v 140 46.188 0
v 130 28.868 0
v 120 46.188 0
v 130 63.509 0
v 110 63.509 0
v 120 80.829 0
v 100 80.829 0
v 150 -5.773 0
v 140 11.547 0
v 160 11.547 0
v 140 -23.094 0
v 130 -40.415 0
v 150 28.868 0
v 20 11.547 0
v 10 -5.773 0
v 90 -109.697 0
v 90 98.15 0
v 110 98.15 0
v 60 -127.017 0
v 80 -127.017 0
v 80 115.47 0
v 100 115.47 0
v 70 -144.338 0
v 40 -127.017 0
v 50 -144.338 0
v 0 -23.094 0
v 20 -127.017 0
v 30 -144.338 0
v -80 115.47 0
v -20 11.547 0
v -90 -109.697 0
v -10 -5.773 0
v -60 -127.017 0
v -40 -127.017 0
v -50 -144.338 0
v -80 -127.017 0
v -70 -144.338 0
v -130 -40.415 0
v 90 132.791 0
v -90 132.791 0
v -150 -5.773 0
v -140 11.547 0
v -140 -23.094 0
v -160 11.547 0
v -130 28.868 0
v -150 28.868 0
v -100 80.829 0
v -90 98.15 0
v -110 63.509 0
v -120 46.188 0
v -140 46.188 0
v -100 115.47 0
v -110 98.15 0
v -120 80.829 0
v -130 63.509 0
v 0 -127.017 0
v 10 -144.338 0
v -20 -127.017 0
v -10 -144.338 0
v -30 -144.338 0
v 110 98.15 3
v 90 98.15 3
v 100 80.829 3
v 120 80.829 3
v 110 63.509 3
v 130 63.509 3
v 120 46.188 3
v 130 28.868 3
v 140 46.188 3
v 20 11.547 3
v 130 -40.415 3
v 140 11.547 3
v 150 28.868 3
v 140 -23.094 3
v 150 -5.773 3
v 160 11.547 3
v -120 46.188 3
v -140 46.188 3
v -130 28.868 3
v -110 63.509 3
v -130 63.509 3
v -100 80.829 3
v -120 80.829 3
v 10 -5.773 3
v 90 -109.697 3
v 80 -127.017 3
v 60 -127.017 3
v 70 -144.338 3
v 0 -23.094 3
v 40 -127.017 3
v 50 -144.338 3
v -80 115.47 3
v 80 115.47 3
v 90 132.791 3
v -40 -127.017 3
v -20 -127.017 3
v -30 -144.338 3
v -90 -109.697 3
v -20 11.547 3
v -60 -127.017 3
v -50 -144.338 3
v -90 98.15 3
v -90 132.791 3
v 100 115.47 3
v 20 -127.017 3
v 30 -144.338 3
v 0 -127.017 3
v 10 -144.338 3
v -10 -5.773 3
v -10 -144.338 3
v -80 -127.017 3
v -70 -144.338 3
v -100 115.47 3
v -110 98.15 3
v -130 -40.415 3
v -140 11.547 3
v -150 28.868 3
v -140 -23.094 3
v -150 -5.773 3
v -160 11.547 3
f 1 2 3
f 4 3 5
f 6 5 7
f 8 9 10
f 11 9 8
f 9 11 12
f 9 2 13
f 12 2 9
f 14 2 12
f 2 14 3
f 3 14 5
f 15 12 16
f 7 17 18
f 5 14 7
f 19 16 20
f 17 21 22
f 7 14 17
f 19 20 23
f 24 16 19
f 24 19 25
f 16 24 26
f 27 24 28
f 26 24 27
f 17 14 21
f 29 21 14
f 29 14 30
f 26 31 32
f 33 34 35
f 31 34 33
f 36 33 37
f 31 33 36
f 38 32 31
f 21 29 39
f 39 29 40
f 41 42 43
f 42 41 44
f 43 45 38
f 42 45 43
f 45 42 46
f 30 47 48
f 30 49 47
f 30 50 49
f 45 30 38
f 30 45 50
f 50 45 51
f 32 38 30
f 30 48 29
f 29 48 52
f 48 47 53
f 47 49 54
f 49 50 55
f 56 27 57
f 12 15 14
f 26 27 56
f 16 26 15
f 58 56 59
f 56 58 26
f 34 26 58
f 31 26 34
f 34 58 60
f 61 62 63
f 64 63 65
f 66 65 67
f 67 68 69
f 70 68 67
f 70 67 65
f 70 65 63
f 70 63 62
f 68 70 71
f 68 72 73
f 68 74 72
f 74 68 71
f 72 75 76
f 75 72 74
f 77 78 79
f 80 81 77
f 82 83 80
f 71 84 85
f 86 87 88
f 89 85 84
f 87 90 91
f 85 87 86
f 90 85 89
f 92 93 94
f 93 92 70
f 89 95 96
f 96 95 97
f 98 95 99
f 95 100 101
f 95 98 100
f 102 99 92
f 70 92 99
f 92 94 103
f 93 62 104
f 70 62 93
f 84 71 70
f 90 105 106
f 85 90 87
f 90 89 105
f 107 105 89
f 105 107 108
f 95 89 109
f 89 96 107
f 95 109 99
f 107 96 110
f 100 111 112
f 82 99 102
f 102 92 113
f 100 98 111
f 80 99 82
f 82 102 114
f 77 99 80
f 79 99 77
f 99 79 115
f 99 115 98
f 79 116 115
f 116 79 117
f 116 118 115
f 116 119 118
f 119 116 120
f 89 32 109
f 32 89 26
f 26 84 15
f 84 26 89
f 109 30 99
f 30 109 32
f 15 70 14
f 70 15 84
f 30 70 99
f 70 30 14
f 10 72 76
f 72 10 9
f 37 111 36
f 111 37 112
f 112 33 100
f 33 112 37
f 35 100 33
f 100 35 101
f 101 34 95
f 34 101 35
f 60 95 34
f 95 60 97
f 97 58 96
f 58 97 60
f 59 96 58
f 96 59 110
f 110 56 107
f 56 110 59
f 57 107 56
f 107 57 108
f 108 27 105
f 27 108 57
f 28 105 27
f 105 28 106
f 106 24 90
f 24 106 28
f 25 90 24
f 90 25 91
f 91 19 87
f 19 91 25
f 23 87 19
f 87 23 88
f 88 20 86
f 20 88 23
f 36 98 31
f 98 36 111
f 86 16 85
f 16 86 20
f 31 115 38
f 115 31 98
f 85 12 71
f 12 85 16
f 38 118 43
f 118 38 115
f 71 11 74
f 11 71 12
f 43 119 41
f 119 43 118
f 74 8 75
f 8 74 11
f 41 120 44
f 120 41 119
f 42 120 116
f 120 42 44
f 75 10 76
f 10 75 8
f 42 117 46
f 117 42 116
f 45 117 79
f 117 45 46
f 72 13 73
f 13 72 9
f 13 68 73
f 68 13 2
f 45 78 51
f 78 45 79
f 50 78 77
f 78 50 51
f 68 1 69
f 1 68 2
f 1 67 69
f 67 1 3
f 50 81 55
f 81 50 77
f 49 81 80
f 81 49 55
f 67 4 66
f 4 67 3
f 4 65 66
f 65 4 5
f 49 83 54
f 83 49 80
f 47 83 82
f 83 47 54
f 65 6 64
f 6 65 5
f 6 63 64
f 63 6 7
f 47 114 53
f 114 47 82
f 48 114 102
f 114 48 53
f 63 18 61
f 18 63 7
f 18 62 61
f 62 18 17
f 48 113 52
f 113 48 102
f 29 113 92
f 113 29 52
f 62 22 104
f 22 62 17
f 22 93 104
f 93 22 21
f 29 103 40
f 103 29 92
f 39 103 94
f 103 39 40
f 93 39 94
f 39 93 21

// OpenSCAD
// file: ../../src/semi_regular/tess_4_8_8.scad
/*
    Tessella: Semi-Regular Tessellation - 4.8.8
    ===========================================
    This module implements the tessellation of a plane using a semi-regular tiling
    pattern defined by the vertex configuration 4.8.8, where one square and two
    octagons meet at each vertex.
*/

include <../tessUtils.scad>;

/**
 * @brief Generates center points for an octagonal grid.
 *
 * Creates a 2D grid of center points for octagons spaced by the octagon's side length.
 *
 * @param radius The radius of each octagon.
 * @param n The number of octagons along the x-axis.
 * @param m The number of octagons along the y-axis.
 * @param rotate (Optional) Boolean to apply rotation to the grid, default is true.
 * @return An array of center points for octagons.
 */
function octagons_centers_rect(
    radius,
    n,
    m
) =
    let (
        side_length = (radius * 2) / (sqrt(4 + 2 * sqrt(2))), // Side length of the octagon
        total_width = side_length * (1 + sqrt(2)) // Total width including spacing
    ) squares_centers_rect(total_width, n, m);

/**
 * @brief Generates center points for the squares in a 4.8.8 tiling grid.
 *
 * Aligns the square centers with the octagonal centers by using a shifted grid,
 * creating the required semi-regular tiling pattern.
 *
 * @param radius The radius of the octagons.
 * @param n The number of octagons along the x-axis.
 * @param m The number of octagons along the y-axis.
 * @return An array of center points for squares.
 */
function squares_8_8_centers_rect(radius, n, m) =
    let (
        side_length = (radius * 2) / (sqrt(4 + 2 * sqrt(2))), // Side length of the octagon
        total_width = side_length * (1 + sqrt(2)), // Total width including spacing
        shift_x = total_width / 2, // Horizontal shift for squares
        shift_y = total_width / 2 // Vertical shift for squares
    ) [for (c = squares_centers_rect(total_width, n - 1, m - 1)) [c[0] + shift_x, c[1] + shift_y]];

/**
 * @brief Generates vertices for octagons based on radius and center points.
 *
 * Generates the vertices for octagons based on the provided center points and radius.
 *
 * @param radius The radius of each octagon.
 * @param centers Array of center points.
 * @param angular_offset (Optional) Rotation angle for vertices, default is 22.5°.
 * @return Array of vertices for each octagon.
 */
function octagons_vertices(radius, centers, angular_offset = 22.5) =
    [
        for (center = centers) [
            for (i = [0:7]) let (
                angle = i * 45 + angular_offset
            ) [center[0] + radius * cos(angle), center[1] + radius * sin(angle)],
        ],
    ];
// file: ../../src/regular/triangles.scad
/*
    Tessella: Regular Tessellation - Triangles
    ==========================================
    This module implements the tessellation of a plane using regular triangles,
    where each tile is congruent, and all vertex angles around a point sum to 360°.

    Polygon properties:
    - Sides: 3
    - Interior Angle: 60°
    - Vertex Configuration: 3.3.3.3.3.3

    Mathematically valid because the interior angle divides 360° exactly.
    Reference: Euclidean tessellation theory for regular polygons.
*/

include <../tessUtils.scad>;

/**
 * @brief Generates center points for a "levels-based" triangle arrangement.
 *
 * Creates a roughly radial or diamond-like pattern of triangle centers. The center row
 * has (2*levels - 1) triangles, each additional row above/below decreases by 1 triangle.
 *
 * @param side   The side length of each equilateral triangle.
 * @param levels Number of levels away from the center row.
 * @return       An array of center points for triangles.
 */
function triangles_centers_radial(side, levels) =
    let (
        // Vertical height of each triangle
        vheight = side * sqrt(3) / 2,
        // Generate rows symmetrically around the center
        rows0 = [
            for (i = [-ceil(levels / 2 - 1):ceil(levels / 2 - 1)])
            let (
                rowCount = (levels - ( (levels + 1) % 2)) - abs(i), // Number of triangles in the row
                yOff = i * vheight, // Vertical offset for the row
                xStart = -(rowCount - 1) * side / 2 // Horizontal start to center the row
            ) [[xStart, yOff], rowCount],
        ],
        rows1 = (levels == 1) ? []
        : [
            for (i = [-(floor(levels / 2)):(floor(levels / 2 - 1))])
            let (
                rowCount = (levels - ( (levels) % 2)) - abs(i), // Number of triangles in the row
                yOff = i * vheight + vheight / 2 - (vheight - sqrt(3) / 3 * side) / 2, // Vertical offset for the row
                xStart = -(rowCount - 1) * side / 2 // Horizontal start to center the row
            ) [[xStart, yOff], rowCount],
        ],
        rows = concat(rows0, rows1)
    )
    // Generate center points for all rows
    [for (row = rows) for (j = [0:row[1] - 1]) [row[0][0] + j * side, row[0][1]]];

/**
 * @brief Generates center points for a rectangular grid of equilateral triangles (n x m).
 *
 * Alternating rows are horizontally offset by half a side for a typical triangular tiling pattern.
 *
 * @param side The side length of each triangle.
 * @param n    Number of triangles along x-axis.
 * @param m    Number of rows (y-axis).
 * @return     An array of center points for triangles.
 */
function triangles_centers_rect(side, n, m) =
    let (
        vheight = side * sqrt(3) / 2, // Vertical height of each triangle
        col_shift = side / 2, // Horizontal shift for each column
        row_shift = vheight, // Horizontal shift for alternating rows
        offset_shift = row_shift - (vheight - sqrt(3) / 3 * side) * 2
    ) [for (j = [0:m - 1], i = [0:n - 1]) [(i) * row_shift + (offset_shift * (j % 2)), j * col_shift]];

/**
 * @brief Generates vertices for equilateral triangles at specified centers.
 *
 * Rotates every other row by 180° and applies an additional angular offset for customization.
 *
 * @param side           The side length of each triangle.
 * @param centers        The array of center points for the triangles.
 * @param angular_offset An additional angular offset to apply to all triangles.
 * @param is_radial      If true, calculates the row index based on radial arrangement.
 * @return               A nested array of vertices for all triangles.
 */
function triangle_vertices(side, centers, angular_offset = 0, rect = true) =
    let (
        EPSILON = 1e-9, // Small value for floating-point comparison
        vheight = side * sqrt(3) / 2, // Vertical height of each triangle
        // This messy line pretty much determines if a row is odd or even based on the vertical position, it needs to check
        // using the reverse calculation of rows1 / offset shift, looking at that now it should probably be refactored.
        // Overall, this works and gets the geometrical idea across, but it's not the most readable (literally horrendous).
        row_parity = [
            for (c = centers) (
                (
                    ( ( ( (rect ? c[0] : c[1]) + EPSILON - vheight / 2 + (vheight - sqrt(3) / 3 * side) / 2) / vheight) % 1) <= EPSILON
                ) && (
                    (
                        ( ( (rect ? c[0] : c[1]) - EPSILON - vheight / 2 + (vheight - sqrt(3) / 3 * side) / 2) / vheight) % 1
                    ) >= -EPSILON
                ) ? 0
                : 1
            ),
        ], // Calculate row parity
        rotation_adjustment = [
            for (i = [0:len(centers) - 1]) (
                row_parity[i] ? (rect ? 0 : 180)
                : (rect ? 180 : 0)
            ),
        ] // Flip every other row
    ) [
            for (i = [0:len(centers) - 1]) [
                for (j = [0:2]) let (
                    angle = j * 120 + angular_offset + rotation_adjustment[i]
                ) [
                        centers[i][0] + side / sqrt(3) * cos(angle),
                        centers[i][1] + side / sqrt(3) * sin(angle),
                ],
            ],
    ];
// file: ../../src/regular/squares.scad
/*
    Tessella: Regular Tessellation - Squares
    ========================================
    This module implements the tessellation of a plane using regular squares,
    where each tile is congruent, and all vertex angles around a point sum to 360°.

    Polygon properties:
    - Sides: 4
    - Interior Angle: 90°
    - Vertex Configuration: 4.4.4.4
*/

include <../tessUtils.scad>;

/**
 * @brief Generates center points for a "levels-based" square arrangement.
 *
 * Creates a diamond-like pattern of square centers. The center (middle) row has (2*levels - 1) squares.
 * Each additional row above or below the center has one fewer square, until only 1 square remains at the
 * top and bottom (when levels > 1).
 *
 * @param side   The side length of each square.
 * @param levels Number of levels (rows above the center, plus the center, plus rows below).
 * @return       An array of center points for squares.
 */
function squares_centers_radial(side, levels) =
    let (
        // Offsets for spacing
        offset_x = side, // Horizontal spacing
        offset_y = side, // Vertical spacing

        // Generate rows from the center outward
        // Row i = -(levels-1) to +(levels-1), where i=0 is the center row.
        rows = [
            for (i = [-(levels - 1):(levels - 1)])
            let (
                rowCount = (2 * levels - 1) - abs(i), // Number of squares in the row
                yOff = i * offset_y, // Vertical position of the row
                xStart = -(rowCount - 1) * offset_x / 2 // Horizontal start to center the row
            ) [[xStart, yOff], rowCount],
        ]
    )
    // For each row definition, generate square center points
    [for (row = rows) for (j = [0:row[1] - 1]) [row[0][0] + j * offset_x, row[0][1]]];

/**
 * @brief Generates center points for a rectangular grid of squares (n x m).
 *
 * Produces a 2D grid of center points spaced by side length in both x and y directions.
 *
 * @param side The side length of each square.
 * @param n    The number of squares along the x-axis.
 * @param m    The number of squares along the y-axis.
 * @return     An array of center points for squares.
 */
function squares_centers_rect(side, n, m) =
    let (offset_x = side, offset_y = side) [for (ix = [0:n - 1], iy = [0:m - 1]) [ix * offset_x, iy * offset_y]];

/**
 * @brief Renders 2D squares at specified centers, with optional color gradient.
 *
 * @param side          The side length of each square.
 * @param spacing       (Optional) Spacing between squares, default is 0.
 * @param centers       (Optional) Array of center points. If empty, `levels` or (n,m) must be provided.
 * @param levels        (Optional) Number of levels for diamond-like pattern generation.
 * @param n, m          (Optional) Grid dimensions if using NxM generation.
 * @param color_scheme  (Optional) Name of the color scheme for gradient.
 * @param alpha         (Optional) Alpha transparency value.
 */

function squares_vertices(side, centers, angular_offset = 45) =
    [
        for (
            center = centers
        ) [
            for (i = [0:3]) let (angle = i * 90 + angular_offset) [
                    center[0] + side / sqrt(2) * cos(angle),
                    center[1] + side / sqrt(2) * sin(angle),
            ],
        ],
    ];
// file: ../../src/regular/hexagons.scad
/*
    Tessella: Regular Tessellation - Hexagons
    =========================================
    Tessellates a plane using regular hexagons.
    Properties:
    - Sides: 6
    - Interior Angle: 120°
    - Vertex Configuration: 6.6.6
*/

include <../tessUtils.scad>;

/**
 * Generates center points for a hexagonal tessellation in a radial pattern.
 * @param radius The radius of each hexagon.
 * @param levels Number of radial levels.
 * @return Array of hexagon center points.
 */
function hexagons_centers_radial(radius, levels) =
    let (
        offset_x = radius * cos(30),
        offset_y = radius + radius * sin(30),
        offset_step = 2 * offset_x,
        dx = -(levels - 1) * offset_x * 2,
        beginning_n = 2 * levels - 1,
        hexagons_pts = function(hex_datum)
        let (
            tx = hex_datum[0][0] + dx,
            ty = hex_datum[0][1],
            n_pts = hex_datum[1],
            offset_xs = [for (i = [0:n_pts - 1]) i * offset_step]
        ) [for (x = offset_xs) [x + tx, ty]],
        upper_hex_data = levels > 1 ? [
                for (i = [1:beginning_n - levels]) let (
                    x = offset_x * i,
                    y = offset_y * i,
                    n_upper = beginning_n - i
                ) [[x, y], n_upper],
            ]
        : [],
        lower_hex_data = levels > 1 ? [for (hex_datum = upper_hex_data) [[hex_datum[0][0], -hex_datum[0][1]], hex_datum[1]]]
        : [],
        total_hex_data = [[[0, 0], beginning_n], each upper_hex_data, each lower_hex_data],
        centers = [for (hex_datum = total_hex_data) hexagons_pts(hex_datum)]
    ) concat([for (c = centers) each c]);

/**
 * Generates center points for a rectangular hexagonal grid.
 * @param radius The radius of each hexagon.
 * @param n Number of hexagons along x-axis.
 * @param m Number of hexagons along y-axis.
 * @return Array of hexagon center points.
 */
function hexagons_centers_rect(radius, n, m) =
    let (
        offset_x = radius * cos(30),
        offset_y = radius + radius * sin(30),
        offset_step = 2 * offset_x
    ) [for (i = [0:n - 1], j = [0:m - 1]) [i * offset_step + (j % 2) * (offset_step / 2), j * offset_y]];

/**
 * Generates vertices for hexagons based on radius and center points.
 * @param radius The radius of each hexagon.
 * @param centers Array of center points.
 * @param angular_offset Rotation angle for vertices.
 * @return Array of vertices for each hexagon.
 */
function hexagons_vertices(radius, centers, angular_offset = 30) =
    [
        for (center = centers) [
            for (i = [0:5]) let (
                angle = i * 60 + angular_offset
            ) [center[0] + radius * cos(angle), center[1] + radius * sin(angle)],
        ],
    ];
// file: ../../src/tessUtils.scad
EPSILON = 1e-3; ///< Tolerance value used for floating-point comparisons.

/**
 * @brief Generates a gradient color based on normalized coordinates and a color scheme.
 *
 * Selects a color by mapping normalized x and y coordinates to RGB values according to the specified color scheme.
 *
 * @param normalized_x The normalized x-coordinate (0 to 1).
 * @param normalized_y The normalized y-coordinate (0 to 1).
 * @param color_scheme The name of the color scheme to use.
 * @return An RGB color array [r, g, b].
 */
function get_gradient_color(normalized_x, normalized_y, color_scheme) =
    color_scheme == "scheme1" ? [normalized_x, 1 - normalized_x, normalized_y]
    : // Red to Blue
    color_scheme == "scheme2" ? [1 - normalized_y, normalized_x, normalized_y]
    : // Green to Magenta
    color_scheme == "scheme3" ? [normalized_y, 1 - normalized_y, normalized_x]
    : // Blue to Yellow
    color_scheme == "scheme4" ? [1 - normalized_x, normalized_x, 1 - normalized_y]
    : // Cyan to Red
    color_scheme == "scheme5" ? [normalized_x, normalized_x * normalized_y, 1 - normalized_x]
    : // Purple to Green
    color_scheme == "scheme6" ? [1 - normalized_x * normalized_y, normalized_y, normalized_x]
    : // Orange to Blue
    [0.9, 0.9, 0.9]; // Default color (grey) if no valid color scheme is provided

/**
 * @brief Renders points as text labels and optional spheres in the 3D space.
 *
 * Displays each point's coordinates as text at its location and optionally places a sphere at the point.
 *
 * @param points An array of points to display, each as [x, y].
 * @param text_size (Optional) Size of the text labels; default is 1.
 * @param color (Optional) Color of the text labels; default is [0.1, 0.1, 0.1].
 * @param pointD (Optional) Diameter of the sphere to place at each point; if undef, no sphere is placed.
 * @param point_color (Optional) Color of the spheres; default is [0.1, 0.1, 0.1].
 * @param fn (Optional) Number of facets for the spheres; default is 8.
 */
module print_points(
    points,
    text_size = 1,
    color = [0.1, 0.1, 0.1],
    pointD = undef,
    point_color = [0.1, 0.1, 0.1],
    fn = 8
) {
    for (point = points) {
        // Translate +1 in Z-axis to avoid z-fighting with the surface
        translate([point[0], point[1] + pointD * 2, pointD * 2]) color(color)
                text(str("[", point[0], ", ", point[1], "]"), size=text_size, valign="center", halign="center");
        if (pointD != undef) {
            // Place a sphere at the point if pointD is specified
            color(point_color) translate([point[0], point[1], 0]) sphere(pointD, $fn=fn);
        }
    }
}

/**
 * @brief Checks if two points are equal within a specified tolerance.
 *
 * @param p1 First point as [x, y].
 * @param p2 Second point as [x, y].
 * @param tolerance (Optional) Tolerance value for comparison; default is EPSILON.
 * @return True if points are equal within tolerance, false otherwise.
 */
function points_equal(p1, p2, tolerance = EPSILON) =
    let (
        comparisons = [
            for (i = [0:len(p1) - 1]) abs(p1[i] - p2[i]) < tolerance,
        ]
    )
    // Check if all comparisons are true
    len([for (comp = comparisons) if (comp) true]) == len(comparisons);

/**
 * @brief Checks if a point exists within a list of points, within a specified tolerance.
 *
 * @param point The point to check, as [x, y].
 * @param list The list of points to search within.
 * @param tolerance (Optional) Tolerance value for comparison; default is EPSILON.
 * @return True if the point exists in the list within tolerance, false otherwise.
 */
function is_point_in_list(
    point,
    list,
    tolerance = EPSILON
) =
    let (equal_points = [for (p = list) points_equal(p, point, tolerance)]) len([for (eq = equal_points) if (eq) true]) > 0;

/**
 * @brief Filters out centers that are present in a filter list.
 *
 * Removes centers from the provided list that match any in the filter_list, within a specified tolerance.
 *
 * @param centers An array of centers to be filtered.
 * @param filter_list An array of centers to filter out.
 * @param tolerance (Optional) Tolerance value for comparison; default is EPSILON.
 * @return A filtered array of centers.
 */
function filter_center_points(centers, filter_list, tolerance = EPSILON) =
    [for (center = centers) if (!is_point_in_list(center, filter_list, tolerance)) center];

/** 
 * @brief Renders a generic polygon shape with optional extrusion and color gradient.
 *
 * This module allows rendering of polygons defined by vertices and paths, with optional extrusion for 3D effects.
 * It supports color gradients based on center points and a specified color scheme.
 *
 * @param vertices An array of vertices for the polygon.    
 * @param paths An array of paths defining the polygon.
 * @param centers (Optional) An array of center points for each polygon, used for color gradient.
 * @param color_scheme (Optional) A string defining the color scheme for the gradient.
 * @param alpha (Optional) Transparency level for the color; default is 1 (opaque).
 * @param extrude (Optional) Height for linear extrusion; if undef, no extrusion is applied.
 * @return Renders the polygon with the specified properties.
 */

module generic_poly(vertices, paths, centers = undef, color_scheme = undef, alpha = 1, extrude = undef) {
    if (!is_undef(color_scheme) && !is_undef(centers)) {
        // Compute normalization bounds
        min_x = min([for (center = centers) center[0]]);
        max_x = max([for (center = centers) center[0]]);
        min_y = min([for (center = centers) center[1]]);
        max_y = max([for (center = centers) center[1]]);

        for (i = [0:len(vertices) - 1]) {
            // Normalize coordinates for color gradient
            normalized_x = (centers[i][0] - min_x) / (max_x - min_x + 1e-9);
            normalized_y = (centers[i][1] - min_y) / (max_y - min_y + 1e-9);

            // Get color value
            color_val = get_gradient_color(normalized_x, normalized_y, color_scheme);

            // Render the shape
            color(color_val, alpha=alpha) if (!is_undef(extrude))
                linear_extrude(height=extrude)
                    polygon(points=vertices[i], paths=paths);
            else
                polygon(points=vertices[i], paths=paths);
        }
    } else {
        for (i = [0:len(vertices) - 1]) {
            // Render the shape without a color gradient
            if (!is_undef(extrude))
                linear_extrude(height=extrude) polygon(points=vertices[i], paths=paths);
            else
                polygon(points=vertices[i], paths=paths);
        }
    }
}
// file: ../../tess.scad
/**
 * @file tess.scad
 * @brief Functions and modules for generating tessellation patterns and rendering shapes.
 * @author Cameron K. Brooks
 * @copyright 2024
 * @info This file serves as an index file to allow for blind importing of all tessellation modules.
 *
 */

// Import utility modules
include <src/tessUtils.scad>

// Import regular tessellation modules

include <src/regular/hexagons.scad>; // Contains hexagon tessellation functions & assets
include <src/regular/squares.scad>; // Contains square tessellation functions & assets
include <src/regular/triangles.scad>; // Contains triangle tessellation functions & assets

// Import semi-regular (Archimedean) tessellation modules
include <src/semi_regular/tess_4_8_8.scad>; // Contains 4.8.8 tessellation functions & octagon assets
// main file
// Radial triangles
// Sixteen levels, 361 triangles, with the four at the centre removed.

use <../../tess.scad>

side = 20;      // Side length of each triangle
spacing = 0;    // Spacing between triangles
lvls = 16;      // Number of levels
extHeight = 10; // Extrusion height for triangles

filter = true; // Enable or disable filtering

// WARNING: Printing the center points can be very slow for large numbers of levels as they are text-annotated
print_pts = false; // Enable or disable printing of center points

// Generate unfiltered center points
unfiltered_centers = triangles_centers_radial(side, lvls);
echo("Unfiltered Centers:", unfiltered_centers);

// Define filter points for the radial tessellation
filter_points_radial = [
    [ 0, 0 ],
    [ 10, 5.7735 ],
    [ -10, 5.7735 ],
    [ 0, -11.547 ],
];

// Filter the center points if filtering is enabled
filtered_centers = filter_center_points(unfiltered_centers, filter_points_radial);
echo("Filtered Centers:", filtered_centers);

// Use filtered or unfiltered center points
centers = filter ? filtered_centers : unfiltered_centers;

// Generate vertices for the triangles
vertices = triangle_vertices(side = side - spacing, centers = centers, angular_offset = 30, rect = false);

// Render the triangles
generic_poly(
    vertices = vertices,
    paths = [[0, 1, 2, 0]], // Triangle paths
    centers = centers,
    color_scheme = "scheme2",
    alpha = 0.7,
    extrude = 3
);
// Note:
// - The 'centers' parameter is used only for calculating the color scheme.
//   If no color scheme is required, this parameter can be omitted.
// - The 'vertices' parameter is mandatory for defining the geometry of the tessellation.
// - The 'paths' parameter defines the connectivity of vertices to form each shape.
//   For triangles, [[0, 1, 2, 0]] ensures a closed loop connecting three vertices.
// - If a flat 2D visualization is sufficient, the 'extrude' parameter can be omitted:
//   generic_poly(vertices = vertices, paths = [[0, 1, 2, 0]]);

// Render points for debugging
if (print_pts)
{
    translate([ 0, 0, extHeight ])
        print_points(centers, text_size = 1, color = "Purple", pointD = 1, point_color = "Orange", fn = 12);
}
